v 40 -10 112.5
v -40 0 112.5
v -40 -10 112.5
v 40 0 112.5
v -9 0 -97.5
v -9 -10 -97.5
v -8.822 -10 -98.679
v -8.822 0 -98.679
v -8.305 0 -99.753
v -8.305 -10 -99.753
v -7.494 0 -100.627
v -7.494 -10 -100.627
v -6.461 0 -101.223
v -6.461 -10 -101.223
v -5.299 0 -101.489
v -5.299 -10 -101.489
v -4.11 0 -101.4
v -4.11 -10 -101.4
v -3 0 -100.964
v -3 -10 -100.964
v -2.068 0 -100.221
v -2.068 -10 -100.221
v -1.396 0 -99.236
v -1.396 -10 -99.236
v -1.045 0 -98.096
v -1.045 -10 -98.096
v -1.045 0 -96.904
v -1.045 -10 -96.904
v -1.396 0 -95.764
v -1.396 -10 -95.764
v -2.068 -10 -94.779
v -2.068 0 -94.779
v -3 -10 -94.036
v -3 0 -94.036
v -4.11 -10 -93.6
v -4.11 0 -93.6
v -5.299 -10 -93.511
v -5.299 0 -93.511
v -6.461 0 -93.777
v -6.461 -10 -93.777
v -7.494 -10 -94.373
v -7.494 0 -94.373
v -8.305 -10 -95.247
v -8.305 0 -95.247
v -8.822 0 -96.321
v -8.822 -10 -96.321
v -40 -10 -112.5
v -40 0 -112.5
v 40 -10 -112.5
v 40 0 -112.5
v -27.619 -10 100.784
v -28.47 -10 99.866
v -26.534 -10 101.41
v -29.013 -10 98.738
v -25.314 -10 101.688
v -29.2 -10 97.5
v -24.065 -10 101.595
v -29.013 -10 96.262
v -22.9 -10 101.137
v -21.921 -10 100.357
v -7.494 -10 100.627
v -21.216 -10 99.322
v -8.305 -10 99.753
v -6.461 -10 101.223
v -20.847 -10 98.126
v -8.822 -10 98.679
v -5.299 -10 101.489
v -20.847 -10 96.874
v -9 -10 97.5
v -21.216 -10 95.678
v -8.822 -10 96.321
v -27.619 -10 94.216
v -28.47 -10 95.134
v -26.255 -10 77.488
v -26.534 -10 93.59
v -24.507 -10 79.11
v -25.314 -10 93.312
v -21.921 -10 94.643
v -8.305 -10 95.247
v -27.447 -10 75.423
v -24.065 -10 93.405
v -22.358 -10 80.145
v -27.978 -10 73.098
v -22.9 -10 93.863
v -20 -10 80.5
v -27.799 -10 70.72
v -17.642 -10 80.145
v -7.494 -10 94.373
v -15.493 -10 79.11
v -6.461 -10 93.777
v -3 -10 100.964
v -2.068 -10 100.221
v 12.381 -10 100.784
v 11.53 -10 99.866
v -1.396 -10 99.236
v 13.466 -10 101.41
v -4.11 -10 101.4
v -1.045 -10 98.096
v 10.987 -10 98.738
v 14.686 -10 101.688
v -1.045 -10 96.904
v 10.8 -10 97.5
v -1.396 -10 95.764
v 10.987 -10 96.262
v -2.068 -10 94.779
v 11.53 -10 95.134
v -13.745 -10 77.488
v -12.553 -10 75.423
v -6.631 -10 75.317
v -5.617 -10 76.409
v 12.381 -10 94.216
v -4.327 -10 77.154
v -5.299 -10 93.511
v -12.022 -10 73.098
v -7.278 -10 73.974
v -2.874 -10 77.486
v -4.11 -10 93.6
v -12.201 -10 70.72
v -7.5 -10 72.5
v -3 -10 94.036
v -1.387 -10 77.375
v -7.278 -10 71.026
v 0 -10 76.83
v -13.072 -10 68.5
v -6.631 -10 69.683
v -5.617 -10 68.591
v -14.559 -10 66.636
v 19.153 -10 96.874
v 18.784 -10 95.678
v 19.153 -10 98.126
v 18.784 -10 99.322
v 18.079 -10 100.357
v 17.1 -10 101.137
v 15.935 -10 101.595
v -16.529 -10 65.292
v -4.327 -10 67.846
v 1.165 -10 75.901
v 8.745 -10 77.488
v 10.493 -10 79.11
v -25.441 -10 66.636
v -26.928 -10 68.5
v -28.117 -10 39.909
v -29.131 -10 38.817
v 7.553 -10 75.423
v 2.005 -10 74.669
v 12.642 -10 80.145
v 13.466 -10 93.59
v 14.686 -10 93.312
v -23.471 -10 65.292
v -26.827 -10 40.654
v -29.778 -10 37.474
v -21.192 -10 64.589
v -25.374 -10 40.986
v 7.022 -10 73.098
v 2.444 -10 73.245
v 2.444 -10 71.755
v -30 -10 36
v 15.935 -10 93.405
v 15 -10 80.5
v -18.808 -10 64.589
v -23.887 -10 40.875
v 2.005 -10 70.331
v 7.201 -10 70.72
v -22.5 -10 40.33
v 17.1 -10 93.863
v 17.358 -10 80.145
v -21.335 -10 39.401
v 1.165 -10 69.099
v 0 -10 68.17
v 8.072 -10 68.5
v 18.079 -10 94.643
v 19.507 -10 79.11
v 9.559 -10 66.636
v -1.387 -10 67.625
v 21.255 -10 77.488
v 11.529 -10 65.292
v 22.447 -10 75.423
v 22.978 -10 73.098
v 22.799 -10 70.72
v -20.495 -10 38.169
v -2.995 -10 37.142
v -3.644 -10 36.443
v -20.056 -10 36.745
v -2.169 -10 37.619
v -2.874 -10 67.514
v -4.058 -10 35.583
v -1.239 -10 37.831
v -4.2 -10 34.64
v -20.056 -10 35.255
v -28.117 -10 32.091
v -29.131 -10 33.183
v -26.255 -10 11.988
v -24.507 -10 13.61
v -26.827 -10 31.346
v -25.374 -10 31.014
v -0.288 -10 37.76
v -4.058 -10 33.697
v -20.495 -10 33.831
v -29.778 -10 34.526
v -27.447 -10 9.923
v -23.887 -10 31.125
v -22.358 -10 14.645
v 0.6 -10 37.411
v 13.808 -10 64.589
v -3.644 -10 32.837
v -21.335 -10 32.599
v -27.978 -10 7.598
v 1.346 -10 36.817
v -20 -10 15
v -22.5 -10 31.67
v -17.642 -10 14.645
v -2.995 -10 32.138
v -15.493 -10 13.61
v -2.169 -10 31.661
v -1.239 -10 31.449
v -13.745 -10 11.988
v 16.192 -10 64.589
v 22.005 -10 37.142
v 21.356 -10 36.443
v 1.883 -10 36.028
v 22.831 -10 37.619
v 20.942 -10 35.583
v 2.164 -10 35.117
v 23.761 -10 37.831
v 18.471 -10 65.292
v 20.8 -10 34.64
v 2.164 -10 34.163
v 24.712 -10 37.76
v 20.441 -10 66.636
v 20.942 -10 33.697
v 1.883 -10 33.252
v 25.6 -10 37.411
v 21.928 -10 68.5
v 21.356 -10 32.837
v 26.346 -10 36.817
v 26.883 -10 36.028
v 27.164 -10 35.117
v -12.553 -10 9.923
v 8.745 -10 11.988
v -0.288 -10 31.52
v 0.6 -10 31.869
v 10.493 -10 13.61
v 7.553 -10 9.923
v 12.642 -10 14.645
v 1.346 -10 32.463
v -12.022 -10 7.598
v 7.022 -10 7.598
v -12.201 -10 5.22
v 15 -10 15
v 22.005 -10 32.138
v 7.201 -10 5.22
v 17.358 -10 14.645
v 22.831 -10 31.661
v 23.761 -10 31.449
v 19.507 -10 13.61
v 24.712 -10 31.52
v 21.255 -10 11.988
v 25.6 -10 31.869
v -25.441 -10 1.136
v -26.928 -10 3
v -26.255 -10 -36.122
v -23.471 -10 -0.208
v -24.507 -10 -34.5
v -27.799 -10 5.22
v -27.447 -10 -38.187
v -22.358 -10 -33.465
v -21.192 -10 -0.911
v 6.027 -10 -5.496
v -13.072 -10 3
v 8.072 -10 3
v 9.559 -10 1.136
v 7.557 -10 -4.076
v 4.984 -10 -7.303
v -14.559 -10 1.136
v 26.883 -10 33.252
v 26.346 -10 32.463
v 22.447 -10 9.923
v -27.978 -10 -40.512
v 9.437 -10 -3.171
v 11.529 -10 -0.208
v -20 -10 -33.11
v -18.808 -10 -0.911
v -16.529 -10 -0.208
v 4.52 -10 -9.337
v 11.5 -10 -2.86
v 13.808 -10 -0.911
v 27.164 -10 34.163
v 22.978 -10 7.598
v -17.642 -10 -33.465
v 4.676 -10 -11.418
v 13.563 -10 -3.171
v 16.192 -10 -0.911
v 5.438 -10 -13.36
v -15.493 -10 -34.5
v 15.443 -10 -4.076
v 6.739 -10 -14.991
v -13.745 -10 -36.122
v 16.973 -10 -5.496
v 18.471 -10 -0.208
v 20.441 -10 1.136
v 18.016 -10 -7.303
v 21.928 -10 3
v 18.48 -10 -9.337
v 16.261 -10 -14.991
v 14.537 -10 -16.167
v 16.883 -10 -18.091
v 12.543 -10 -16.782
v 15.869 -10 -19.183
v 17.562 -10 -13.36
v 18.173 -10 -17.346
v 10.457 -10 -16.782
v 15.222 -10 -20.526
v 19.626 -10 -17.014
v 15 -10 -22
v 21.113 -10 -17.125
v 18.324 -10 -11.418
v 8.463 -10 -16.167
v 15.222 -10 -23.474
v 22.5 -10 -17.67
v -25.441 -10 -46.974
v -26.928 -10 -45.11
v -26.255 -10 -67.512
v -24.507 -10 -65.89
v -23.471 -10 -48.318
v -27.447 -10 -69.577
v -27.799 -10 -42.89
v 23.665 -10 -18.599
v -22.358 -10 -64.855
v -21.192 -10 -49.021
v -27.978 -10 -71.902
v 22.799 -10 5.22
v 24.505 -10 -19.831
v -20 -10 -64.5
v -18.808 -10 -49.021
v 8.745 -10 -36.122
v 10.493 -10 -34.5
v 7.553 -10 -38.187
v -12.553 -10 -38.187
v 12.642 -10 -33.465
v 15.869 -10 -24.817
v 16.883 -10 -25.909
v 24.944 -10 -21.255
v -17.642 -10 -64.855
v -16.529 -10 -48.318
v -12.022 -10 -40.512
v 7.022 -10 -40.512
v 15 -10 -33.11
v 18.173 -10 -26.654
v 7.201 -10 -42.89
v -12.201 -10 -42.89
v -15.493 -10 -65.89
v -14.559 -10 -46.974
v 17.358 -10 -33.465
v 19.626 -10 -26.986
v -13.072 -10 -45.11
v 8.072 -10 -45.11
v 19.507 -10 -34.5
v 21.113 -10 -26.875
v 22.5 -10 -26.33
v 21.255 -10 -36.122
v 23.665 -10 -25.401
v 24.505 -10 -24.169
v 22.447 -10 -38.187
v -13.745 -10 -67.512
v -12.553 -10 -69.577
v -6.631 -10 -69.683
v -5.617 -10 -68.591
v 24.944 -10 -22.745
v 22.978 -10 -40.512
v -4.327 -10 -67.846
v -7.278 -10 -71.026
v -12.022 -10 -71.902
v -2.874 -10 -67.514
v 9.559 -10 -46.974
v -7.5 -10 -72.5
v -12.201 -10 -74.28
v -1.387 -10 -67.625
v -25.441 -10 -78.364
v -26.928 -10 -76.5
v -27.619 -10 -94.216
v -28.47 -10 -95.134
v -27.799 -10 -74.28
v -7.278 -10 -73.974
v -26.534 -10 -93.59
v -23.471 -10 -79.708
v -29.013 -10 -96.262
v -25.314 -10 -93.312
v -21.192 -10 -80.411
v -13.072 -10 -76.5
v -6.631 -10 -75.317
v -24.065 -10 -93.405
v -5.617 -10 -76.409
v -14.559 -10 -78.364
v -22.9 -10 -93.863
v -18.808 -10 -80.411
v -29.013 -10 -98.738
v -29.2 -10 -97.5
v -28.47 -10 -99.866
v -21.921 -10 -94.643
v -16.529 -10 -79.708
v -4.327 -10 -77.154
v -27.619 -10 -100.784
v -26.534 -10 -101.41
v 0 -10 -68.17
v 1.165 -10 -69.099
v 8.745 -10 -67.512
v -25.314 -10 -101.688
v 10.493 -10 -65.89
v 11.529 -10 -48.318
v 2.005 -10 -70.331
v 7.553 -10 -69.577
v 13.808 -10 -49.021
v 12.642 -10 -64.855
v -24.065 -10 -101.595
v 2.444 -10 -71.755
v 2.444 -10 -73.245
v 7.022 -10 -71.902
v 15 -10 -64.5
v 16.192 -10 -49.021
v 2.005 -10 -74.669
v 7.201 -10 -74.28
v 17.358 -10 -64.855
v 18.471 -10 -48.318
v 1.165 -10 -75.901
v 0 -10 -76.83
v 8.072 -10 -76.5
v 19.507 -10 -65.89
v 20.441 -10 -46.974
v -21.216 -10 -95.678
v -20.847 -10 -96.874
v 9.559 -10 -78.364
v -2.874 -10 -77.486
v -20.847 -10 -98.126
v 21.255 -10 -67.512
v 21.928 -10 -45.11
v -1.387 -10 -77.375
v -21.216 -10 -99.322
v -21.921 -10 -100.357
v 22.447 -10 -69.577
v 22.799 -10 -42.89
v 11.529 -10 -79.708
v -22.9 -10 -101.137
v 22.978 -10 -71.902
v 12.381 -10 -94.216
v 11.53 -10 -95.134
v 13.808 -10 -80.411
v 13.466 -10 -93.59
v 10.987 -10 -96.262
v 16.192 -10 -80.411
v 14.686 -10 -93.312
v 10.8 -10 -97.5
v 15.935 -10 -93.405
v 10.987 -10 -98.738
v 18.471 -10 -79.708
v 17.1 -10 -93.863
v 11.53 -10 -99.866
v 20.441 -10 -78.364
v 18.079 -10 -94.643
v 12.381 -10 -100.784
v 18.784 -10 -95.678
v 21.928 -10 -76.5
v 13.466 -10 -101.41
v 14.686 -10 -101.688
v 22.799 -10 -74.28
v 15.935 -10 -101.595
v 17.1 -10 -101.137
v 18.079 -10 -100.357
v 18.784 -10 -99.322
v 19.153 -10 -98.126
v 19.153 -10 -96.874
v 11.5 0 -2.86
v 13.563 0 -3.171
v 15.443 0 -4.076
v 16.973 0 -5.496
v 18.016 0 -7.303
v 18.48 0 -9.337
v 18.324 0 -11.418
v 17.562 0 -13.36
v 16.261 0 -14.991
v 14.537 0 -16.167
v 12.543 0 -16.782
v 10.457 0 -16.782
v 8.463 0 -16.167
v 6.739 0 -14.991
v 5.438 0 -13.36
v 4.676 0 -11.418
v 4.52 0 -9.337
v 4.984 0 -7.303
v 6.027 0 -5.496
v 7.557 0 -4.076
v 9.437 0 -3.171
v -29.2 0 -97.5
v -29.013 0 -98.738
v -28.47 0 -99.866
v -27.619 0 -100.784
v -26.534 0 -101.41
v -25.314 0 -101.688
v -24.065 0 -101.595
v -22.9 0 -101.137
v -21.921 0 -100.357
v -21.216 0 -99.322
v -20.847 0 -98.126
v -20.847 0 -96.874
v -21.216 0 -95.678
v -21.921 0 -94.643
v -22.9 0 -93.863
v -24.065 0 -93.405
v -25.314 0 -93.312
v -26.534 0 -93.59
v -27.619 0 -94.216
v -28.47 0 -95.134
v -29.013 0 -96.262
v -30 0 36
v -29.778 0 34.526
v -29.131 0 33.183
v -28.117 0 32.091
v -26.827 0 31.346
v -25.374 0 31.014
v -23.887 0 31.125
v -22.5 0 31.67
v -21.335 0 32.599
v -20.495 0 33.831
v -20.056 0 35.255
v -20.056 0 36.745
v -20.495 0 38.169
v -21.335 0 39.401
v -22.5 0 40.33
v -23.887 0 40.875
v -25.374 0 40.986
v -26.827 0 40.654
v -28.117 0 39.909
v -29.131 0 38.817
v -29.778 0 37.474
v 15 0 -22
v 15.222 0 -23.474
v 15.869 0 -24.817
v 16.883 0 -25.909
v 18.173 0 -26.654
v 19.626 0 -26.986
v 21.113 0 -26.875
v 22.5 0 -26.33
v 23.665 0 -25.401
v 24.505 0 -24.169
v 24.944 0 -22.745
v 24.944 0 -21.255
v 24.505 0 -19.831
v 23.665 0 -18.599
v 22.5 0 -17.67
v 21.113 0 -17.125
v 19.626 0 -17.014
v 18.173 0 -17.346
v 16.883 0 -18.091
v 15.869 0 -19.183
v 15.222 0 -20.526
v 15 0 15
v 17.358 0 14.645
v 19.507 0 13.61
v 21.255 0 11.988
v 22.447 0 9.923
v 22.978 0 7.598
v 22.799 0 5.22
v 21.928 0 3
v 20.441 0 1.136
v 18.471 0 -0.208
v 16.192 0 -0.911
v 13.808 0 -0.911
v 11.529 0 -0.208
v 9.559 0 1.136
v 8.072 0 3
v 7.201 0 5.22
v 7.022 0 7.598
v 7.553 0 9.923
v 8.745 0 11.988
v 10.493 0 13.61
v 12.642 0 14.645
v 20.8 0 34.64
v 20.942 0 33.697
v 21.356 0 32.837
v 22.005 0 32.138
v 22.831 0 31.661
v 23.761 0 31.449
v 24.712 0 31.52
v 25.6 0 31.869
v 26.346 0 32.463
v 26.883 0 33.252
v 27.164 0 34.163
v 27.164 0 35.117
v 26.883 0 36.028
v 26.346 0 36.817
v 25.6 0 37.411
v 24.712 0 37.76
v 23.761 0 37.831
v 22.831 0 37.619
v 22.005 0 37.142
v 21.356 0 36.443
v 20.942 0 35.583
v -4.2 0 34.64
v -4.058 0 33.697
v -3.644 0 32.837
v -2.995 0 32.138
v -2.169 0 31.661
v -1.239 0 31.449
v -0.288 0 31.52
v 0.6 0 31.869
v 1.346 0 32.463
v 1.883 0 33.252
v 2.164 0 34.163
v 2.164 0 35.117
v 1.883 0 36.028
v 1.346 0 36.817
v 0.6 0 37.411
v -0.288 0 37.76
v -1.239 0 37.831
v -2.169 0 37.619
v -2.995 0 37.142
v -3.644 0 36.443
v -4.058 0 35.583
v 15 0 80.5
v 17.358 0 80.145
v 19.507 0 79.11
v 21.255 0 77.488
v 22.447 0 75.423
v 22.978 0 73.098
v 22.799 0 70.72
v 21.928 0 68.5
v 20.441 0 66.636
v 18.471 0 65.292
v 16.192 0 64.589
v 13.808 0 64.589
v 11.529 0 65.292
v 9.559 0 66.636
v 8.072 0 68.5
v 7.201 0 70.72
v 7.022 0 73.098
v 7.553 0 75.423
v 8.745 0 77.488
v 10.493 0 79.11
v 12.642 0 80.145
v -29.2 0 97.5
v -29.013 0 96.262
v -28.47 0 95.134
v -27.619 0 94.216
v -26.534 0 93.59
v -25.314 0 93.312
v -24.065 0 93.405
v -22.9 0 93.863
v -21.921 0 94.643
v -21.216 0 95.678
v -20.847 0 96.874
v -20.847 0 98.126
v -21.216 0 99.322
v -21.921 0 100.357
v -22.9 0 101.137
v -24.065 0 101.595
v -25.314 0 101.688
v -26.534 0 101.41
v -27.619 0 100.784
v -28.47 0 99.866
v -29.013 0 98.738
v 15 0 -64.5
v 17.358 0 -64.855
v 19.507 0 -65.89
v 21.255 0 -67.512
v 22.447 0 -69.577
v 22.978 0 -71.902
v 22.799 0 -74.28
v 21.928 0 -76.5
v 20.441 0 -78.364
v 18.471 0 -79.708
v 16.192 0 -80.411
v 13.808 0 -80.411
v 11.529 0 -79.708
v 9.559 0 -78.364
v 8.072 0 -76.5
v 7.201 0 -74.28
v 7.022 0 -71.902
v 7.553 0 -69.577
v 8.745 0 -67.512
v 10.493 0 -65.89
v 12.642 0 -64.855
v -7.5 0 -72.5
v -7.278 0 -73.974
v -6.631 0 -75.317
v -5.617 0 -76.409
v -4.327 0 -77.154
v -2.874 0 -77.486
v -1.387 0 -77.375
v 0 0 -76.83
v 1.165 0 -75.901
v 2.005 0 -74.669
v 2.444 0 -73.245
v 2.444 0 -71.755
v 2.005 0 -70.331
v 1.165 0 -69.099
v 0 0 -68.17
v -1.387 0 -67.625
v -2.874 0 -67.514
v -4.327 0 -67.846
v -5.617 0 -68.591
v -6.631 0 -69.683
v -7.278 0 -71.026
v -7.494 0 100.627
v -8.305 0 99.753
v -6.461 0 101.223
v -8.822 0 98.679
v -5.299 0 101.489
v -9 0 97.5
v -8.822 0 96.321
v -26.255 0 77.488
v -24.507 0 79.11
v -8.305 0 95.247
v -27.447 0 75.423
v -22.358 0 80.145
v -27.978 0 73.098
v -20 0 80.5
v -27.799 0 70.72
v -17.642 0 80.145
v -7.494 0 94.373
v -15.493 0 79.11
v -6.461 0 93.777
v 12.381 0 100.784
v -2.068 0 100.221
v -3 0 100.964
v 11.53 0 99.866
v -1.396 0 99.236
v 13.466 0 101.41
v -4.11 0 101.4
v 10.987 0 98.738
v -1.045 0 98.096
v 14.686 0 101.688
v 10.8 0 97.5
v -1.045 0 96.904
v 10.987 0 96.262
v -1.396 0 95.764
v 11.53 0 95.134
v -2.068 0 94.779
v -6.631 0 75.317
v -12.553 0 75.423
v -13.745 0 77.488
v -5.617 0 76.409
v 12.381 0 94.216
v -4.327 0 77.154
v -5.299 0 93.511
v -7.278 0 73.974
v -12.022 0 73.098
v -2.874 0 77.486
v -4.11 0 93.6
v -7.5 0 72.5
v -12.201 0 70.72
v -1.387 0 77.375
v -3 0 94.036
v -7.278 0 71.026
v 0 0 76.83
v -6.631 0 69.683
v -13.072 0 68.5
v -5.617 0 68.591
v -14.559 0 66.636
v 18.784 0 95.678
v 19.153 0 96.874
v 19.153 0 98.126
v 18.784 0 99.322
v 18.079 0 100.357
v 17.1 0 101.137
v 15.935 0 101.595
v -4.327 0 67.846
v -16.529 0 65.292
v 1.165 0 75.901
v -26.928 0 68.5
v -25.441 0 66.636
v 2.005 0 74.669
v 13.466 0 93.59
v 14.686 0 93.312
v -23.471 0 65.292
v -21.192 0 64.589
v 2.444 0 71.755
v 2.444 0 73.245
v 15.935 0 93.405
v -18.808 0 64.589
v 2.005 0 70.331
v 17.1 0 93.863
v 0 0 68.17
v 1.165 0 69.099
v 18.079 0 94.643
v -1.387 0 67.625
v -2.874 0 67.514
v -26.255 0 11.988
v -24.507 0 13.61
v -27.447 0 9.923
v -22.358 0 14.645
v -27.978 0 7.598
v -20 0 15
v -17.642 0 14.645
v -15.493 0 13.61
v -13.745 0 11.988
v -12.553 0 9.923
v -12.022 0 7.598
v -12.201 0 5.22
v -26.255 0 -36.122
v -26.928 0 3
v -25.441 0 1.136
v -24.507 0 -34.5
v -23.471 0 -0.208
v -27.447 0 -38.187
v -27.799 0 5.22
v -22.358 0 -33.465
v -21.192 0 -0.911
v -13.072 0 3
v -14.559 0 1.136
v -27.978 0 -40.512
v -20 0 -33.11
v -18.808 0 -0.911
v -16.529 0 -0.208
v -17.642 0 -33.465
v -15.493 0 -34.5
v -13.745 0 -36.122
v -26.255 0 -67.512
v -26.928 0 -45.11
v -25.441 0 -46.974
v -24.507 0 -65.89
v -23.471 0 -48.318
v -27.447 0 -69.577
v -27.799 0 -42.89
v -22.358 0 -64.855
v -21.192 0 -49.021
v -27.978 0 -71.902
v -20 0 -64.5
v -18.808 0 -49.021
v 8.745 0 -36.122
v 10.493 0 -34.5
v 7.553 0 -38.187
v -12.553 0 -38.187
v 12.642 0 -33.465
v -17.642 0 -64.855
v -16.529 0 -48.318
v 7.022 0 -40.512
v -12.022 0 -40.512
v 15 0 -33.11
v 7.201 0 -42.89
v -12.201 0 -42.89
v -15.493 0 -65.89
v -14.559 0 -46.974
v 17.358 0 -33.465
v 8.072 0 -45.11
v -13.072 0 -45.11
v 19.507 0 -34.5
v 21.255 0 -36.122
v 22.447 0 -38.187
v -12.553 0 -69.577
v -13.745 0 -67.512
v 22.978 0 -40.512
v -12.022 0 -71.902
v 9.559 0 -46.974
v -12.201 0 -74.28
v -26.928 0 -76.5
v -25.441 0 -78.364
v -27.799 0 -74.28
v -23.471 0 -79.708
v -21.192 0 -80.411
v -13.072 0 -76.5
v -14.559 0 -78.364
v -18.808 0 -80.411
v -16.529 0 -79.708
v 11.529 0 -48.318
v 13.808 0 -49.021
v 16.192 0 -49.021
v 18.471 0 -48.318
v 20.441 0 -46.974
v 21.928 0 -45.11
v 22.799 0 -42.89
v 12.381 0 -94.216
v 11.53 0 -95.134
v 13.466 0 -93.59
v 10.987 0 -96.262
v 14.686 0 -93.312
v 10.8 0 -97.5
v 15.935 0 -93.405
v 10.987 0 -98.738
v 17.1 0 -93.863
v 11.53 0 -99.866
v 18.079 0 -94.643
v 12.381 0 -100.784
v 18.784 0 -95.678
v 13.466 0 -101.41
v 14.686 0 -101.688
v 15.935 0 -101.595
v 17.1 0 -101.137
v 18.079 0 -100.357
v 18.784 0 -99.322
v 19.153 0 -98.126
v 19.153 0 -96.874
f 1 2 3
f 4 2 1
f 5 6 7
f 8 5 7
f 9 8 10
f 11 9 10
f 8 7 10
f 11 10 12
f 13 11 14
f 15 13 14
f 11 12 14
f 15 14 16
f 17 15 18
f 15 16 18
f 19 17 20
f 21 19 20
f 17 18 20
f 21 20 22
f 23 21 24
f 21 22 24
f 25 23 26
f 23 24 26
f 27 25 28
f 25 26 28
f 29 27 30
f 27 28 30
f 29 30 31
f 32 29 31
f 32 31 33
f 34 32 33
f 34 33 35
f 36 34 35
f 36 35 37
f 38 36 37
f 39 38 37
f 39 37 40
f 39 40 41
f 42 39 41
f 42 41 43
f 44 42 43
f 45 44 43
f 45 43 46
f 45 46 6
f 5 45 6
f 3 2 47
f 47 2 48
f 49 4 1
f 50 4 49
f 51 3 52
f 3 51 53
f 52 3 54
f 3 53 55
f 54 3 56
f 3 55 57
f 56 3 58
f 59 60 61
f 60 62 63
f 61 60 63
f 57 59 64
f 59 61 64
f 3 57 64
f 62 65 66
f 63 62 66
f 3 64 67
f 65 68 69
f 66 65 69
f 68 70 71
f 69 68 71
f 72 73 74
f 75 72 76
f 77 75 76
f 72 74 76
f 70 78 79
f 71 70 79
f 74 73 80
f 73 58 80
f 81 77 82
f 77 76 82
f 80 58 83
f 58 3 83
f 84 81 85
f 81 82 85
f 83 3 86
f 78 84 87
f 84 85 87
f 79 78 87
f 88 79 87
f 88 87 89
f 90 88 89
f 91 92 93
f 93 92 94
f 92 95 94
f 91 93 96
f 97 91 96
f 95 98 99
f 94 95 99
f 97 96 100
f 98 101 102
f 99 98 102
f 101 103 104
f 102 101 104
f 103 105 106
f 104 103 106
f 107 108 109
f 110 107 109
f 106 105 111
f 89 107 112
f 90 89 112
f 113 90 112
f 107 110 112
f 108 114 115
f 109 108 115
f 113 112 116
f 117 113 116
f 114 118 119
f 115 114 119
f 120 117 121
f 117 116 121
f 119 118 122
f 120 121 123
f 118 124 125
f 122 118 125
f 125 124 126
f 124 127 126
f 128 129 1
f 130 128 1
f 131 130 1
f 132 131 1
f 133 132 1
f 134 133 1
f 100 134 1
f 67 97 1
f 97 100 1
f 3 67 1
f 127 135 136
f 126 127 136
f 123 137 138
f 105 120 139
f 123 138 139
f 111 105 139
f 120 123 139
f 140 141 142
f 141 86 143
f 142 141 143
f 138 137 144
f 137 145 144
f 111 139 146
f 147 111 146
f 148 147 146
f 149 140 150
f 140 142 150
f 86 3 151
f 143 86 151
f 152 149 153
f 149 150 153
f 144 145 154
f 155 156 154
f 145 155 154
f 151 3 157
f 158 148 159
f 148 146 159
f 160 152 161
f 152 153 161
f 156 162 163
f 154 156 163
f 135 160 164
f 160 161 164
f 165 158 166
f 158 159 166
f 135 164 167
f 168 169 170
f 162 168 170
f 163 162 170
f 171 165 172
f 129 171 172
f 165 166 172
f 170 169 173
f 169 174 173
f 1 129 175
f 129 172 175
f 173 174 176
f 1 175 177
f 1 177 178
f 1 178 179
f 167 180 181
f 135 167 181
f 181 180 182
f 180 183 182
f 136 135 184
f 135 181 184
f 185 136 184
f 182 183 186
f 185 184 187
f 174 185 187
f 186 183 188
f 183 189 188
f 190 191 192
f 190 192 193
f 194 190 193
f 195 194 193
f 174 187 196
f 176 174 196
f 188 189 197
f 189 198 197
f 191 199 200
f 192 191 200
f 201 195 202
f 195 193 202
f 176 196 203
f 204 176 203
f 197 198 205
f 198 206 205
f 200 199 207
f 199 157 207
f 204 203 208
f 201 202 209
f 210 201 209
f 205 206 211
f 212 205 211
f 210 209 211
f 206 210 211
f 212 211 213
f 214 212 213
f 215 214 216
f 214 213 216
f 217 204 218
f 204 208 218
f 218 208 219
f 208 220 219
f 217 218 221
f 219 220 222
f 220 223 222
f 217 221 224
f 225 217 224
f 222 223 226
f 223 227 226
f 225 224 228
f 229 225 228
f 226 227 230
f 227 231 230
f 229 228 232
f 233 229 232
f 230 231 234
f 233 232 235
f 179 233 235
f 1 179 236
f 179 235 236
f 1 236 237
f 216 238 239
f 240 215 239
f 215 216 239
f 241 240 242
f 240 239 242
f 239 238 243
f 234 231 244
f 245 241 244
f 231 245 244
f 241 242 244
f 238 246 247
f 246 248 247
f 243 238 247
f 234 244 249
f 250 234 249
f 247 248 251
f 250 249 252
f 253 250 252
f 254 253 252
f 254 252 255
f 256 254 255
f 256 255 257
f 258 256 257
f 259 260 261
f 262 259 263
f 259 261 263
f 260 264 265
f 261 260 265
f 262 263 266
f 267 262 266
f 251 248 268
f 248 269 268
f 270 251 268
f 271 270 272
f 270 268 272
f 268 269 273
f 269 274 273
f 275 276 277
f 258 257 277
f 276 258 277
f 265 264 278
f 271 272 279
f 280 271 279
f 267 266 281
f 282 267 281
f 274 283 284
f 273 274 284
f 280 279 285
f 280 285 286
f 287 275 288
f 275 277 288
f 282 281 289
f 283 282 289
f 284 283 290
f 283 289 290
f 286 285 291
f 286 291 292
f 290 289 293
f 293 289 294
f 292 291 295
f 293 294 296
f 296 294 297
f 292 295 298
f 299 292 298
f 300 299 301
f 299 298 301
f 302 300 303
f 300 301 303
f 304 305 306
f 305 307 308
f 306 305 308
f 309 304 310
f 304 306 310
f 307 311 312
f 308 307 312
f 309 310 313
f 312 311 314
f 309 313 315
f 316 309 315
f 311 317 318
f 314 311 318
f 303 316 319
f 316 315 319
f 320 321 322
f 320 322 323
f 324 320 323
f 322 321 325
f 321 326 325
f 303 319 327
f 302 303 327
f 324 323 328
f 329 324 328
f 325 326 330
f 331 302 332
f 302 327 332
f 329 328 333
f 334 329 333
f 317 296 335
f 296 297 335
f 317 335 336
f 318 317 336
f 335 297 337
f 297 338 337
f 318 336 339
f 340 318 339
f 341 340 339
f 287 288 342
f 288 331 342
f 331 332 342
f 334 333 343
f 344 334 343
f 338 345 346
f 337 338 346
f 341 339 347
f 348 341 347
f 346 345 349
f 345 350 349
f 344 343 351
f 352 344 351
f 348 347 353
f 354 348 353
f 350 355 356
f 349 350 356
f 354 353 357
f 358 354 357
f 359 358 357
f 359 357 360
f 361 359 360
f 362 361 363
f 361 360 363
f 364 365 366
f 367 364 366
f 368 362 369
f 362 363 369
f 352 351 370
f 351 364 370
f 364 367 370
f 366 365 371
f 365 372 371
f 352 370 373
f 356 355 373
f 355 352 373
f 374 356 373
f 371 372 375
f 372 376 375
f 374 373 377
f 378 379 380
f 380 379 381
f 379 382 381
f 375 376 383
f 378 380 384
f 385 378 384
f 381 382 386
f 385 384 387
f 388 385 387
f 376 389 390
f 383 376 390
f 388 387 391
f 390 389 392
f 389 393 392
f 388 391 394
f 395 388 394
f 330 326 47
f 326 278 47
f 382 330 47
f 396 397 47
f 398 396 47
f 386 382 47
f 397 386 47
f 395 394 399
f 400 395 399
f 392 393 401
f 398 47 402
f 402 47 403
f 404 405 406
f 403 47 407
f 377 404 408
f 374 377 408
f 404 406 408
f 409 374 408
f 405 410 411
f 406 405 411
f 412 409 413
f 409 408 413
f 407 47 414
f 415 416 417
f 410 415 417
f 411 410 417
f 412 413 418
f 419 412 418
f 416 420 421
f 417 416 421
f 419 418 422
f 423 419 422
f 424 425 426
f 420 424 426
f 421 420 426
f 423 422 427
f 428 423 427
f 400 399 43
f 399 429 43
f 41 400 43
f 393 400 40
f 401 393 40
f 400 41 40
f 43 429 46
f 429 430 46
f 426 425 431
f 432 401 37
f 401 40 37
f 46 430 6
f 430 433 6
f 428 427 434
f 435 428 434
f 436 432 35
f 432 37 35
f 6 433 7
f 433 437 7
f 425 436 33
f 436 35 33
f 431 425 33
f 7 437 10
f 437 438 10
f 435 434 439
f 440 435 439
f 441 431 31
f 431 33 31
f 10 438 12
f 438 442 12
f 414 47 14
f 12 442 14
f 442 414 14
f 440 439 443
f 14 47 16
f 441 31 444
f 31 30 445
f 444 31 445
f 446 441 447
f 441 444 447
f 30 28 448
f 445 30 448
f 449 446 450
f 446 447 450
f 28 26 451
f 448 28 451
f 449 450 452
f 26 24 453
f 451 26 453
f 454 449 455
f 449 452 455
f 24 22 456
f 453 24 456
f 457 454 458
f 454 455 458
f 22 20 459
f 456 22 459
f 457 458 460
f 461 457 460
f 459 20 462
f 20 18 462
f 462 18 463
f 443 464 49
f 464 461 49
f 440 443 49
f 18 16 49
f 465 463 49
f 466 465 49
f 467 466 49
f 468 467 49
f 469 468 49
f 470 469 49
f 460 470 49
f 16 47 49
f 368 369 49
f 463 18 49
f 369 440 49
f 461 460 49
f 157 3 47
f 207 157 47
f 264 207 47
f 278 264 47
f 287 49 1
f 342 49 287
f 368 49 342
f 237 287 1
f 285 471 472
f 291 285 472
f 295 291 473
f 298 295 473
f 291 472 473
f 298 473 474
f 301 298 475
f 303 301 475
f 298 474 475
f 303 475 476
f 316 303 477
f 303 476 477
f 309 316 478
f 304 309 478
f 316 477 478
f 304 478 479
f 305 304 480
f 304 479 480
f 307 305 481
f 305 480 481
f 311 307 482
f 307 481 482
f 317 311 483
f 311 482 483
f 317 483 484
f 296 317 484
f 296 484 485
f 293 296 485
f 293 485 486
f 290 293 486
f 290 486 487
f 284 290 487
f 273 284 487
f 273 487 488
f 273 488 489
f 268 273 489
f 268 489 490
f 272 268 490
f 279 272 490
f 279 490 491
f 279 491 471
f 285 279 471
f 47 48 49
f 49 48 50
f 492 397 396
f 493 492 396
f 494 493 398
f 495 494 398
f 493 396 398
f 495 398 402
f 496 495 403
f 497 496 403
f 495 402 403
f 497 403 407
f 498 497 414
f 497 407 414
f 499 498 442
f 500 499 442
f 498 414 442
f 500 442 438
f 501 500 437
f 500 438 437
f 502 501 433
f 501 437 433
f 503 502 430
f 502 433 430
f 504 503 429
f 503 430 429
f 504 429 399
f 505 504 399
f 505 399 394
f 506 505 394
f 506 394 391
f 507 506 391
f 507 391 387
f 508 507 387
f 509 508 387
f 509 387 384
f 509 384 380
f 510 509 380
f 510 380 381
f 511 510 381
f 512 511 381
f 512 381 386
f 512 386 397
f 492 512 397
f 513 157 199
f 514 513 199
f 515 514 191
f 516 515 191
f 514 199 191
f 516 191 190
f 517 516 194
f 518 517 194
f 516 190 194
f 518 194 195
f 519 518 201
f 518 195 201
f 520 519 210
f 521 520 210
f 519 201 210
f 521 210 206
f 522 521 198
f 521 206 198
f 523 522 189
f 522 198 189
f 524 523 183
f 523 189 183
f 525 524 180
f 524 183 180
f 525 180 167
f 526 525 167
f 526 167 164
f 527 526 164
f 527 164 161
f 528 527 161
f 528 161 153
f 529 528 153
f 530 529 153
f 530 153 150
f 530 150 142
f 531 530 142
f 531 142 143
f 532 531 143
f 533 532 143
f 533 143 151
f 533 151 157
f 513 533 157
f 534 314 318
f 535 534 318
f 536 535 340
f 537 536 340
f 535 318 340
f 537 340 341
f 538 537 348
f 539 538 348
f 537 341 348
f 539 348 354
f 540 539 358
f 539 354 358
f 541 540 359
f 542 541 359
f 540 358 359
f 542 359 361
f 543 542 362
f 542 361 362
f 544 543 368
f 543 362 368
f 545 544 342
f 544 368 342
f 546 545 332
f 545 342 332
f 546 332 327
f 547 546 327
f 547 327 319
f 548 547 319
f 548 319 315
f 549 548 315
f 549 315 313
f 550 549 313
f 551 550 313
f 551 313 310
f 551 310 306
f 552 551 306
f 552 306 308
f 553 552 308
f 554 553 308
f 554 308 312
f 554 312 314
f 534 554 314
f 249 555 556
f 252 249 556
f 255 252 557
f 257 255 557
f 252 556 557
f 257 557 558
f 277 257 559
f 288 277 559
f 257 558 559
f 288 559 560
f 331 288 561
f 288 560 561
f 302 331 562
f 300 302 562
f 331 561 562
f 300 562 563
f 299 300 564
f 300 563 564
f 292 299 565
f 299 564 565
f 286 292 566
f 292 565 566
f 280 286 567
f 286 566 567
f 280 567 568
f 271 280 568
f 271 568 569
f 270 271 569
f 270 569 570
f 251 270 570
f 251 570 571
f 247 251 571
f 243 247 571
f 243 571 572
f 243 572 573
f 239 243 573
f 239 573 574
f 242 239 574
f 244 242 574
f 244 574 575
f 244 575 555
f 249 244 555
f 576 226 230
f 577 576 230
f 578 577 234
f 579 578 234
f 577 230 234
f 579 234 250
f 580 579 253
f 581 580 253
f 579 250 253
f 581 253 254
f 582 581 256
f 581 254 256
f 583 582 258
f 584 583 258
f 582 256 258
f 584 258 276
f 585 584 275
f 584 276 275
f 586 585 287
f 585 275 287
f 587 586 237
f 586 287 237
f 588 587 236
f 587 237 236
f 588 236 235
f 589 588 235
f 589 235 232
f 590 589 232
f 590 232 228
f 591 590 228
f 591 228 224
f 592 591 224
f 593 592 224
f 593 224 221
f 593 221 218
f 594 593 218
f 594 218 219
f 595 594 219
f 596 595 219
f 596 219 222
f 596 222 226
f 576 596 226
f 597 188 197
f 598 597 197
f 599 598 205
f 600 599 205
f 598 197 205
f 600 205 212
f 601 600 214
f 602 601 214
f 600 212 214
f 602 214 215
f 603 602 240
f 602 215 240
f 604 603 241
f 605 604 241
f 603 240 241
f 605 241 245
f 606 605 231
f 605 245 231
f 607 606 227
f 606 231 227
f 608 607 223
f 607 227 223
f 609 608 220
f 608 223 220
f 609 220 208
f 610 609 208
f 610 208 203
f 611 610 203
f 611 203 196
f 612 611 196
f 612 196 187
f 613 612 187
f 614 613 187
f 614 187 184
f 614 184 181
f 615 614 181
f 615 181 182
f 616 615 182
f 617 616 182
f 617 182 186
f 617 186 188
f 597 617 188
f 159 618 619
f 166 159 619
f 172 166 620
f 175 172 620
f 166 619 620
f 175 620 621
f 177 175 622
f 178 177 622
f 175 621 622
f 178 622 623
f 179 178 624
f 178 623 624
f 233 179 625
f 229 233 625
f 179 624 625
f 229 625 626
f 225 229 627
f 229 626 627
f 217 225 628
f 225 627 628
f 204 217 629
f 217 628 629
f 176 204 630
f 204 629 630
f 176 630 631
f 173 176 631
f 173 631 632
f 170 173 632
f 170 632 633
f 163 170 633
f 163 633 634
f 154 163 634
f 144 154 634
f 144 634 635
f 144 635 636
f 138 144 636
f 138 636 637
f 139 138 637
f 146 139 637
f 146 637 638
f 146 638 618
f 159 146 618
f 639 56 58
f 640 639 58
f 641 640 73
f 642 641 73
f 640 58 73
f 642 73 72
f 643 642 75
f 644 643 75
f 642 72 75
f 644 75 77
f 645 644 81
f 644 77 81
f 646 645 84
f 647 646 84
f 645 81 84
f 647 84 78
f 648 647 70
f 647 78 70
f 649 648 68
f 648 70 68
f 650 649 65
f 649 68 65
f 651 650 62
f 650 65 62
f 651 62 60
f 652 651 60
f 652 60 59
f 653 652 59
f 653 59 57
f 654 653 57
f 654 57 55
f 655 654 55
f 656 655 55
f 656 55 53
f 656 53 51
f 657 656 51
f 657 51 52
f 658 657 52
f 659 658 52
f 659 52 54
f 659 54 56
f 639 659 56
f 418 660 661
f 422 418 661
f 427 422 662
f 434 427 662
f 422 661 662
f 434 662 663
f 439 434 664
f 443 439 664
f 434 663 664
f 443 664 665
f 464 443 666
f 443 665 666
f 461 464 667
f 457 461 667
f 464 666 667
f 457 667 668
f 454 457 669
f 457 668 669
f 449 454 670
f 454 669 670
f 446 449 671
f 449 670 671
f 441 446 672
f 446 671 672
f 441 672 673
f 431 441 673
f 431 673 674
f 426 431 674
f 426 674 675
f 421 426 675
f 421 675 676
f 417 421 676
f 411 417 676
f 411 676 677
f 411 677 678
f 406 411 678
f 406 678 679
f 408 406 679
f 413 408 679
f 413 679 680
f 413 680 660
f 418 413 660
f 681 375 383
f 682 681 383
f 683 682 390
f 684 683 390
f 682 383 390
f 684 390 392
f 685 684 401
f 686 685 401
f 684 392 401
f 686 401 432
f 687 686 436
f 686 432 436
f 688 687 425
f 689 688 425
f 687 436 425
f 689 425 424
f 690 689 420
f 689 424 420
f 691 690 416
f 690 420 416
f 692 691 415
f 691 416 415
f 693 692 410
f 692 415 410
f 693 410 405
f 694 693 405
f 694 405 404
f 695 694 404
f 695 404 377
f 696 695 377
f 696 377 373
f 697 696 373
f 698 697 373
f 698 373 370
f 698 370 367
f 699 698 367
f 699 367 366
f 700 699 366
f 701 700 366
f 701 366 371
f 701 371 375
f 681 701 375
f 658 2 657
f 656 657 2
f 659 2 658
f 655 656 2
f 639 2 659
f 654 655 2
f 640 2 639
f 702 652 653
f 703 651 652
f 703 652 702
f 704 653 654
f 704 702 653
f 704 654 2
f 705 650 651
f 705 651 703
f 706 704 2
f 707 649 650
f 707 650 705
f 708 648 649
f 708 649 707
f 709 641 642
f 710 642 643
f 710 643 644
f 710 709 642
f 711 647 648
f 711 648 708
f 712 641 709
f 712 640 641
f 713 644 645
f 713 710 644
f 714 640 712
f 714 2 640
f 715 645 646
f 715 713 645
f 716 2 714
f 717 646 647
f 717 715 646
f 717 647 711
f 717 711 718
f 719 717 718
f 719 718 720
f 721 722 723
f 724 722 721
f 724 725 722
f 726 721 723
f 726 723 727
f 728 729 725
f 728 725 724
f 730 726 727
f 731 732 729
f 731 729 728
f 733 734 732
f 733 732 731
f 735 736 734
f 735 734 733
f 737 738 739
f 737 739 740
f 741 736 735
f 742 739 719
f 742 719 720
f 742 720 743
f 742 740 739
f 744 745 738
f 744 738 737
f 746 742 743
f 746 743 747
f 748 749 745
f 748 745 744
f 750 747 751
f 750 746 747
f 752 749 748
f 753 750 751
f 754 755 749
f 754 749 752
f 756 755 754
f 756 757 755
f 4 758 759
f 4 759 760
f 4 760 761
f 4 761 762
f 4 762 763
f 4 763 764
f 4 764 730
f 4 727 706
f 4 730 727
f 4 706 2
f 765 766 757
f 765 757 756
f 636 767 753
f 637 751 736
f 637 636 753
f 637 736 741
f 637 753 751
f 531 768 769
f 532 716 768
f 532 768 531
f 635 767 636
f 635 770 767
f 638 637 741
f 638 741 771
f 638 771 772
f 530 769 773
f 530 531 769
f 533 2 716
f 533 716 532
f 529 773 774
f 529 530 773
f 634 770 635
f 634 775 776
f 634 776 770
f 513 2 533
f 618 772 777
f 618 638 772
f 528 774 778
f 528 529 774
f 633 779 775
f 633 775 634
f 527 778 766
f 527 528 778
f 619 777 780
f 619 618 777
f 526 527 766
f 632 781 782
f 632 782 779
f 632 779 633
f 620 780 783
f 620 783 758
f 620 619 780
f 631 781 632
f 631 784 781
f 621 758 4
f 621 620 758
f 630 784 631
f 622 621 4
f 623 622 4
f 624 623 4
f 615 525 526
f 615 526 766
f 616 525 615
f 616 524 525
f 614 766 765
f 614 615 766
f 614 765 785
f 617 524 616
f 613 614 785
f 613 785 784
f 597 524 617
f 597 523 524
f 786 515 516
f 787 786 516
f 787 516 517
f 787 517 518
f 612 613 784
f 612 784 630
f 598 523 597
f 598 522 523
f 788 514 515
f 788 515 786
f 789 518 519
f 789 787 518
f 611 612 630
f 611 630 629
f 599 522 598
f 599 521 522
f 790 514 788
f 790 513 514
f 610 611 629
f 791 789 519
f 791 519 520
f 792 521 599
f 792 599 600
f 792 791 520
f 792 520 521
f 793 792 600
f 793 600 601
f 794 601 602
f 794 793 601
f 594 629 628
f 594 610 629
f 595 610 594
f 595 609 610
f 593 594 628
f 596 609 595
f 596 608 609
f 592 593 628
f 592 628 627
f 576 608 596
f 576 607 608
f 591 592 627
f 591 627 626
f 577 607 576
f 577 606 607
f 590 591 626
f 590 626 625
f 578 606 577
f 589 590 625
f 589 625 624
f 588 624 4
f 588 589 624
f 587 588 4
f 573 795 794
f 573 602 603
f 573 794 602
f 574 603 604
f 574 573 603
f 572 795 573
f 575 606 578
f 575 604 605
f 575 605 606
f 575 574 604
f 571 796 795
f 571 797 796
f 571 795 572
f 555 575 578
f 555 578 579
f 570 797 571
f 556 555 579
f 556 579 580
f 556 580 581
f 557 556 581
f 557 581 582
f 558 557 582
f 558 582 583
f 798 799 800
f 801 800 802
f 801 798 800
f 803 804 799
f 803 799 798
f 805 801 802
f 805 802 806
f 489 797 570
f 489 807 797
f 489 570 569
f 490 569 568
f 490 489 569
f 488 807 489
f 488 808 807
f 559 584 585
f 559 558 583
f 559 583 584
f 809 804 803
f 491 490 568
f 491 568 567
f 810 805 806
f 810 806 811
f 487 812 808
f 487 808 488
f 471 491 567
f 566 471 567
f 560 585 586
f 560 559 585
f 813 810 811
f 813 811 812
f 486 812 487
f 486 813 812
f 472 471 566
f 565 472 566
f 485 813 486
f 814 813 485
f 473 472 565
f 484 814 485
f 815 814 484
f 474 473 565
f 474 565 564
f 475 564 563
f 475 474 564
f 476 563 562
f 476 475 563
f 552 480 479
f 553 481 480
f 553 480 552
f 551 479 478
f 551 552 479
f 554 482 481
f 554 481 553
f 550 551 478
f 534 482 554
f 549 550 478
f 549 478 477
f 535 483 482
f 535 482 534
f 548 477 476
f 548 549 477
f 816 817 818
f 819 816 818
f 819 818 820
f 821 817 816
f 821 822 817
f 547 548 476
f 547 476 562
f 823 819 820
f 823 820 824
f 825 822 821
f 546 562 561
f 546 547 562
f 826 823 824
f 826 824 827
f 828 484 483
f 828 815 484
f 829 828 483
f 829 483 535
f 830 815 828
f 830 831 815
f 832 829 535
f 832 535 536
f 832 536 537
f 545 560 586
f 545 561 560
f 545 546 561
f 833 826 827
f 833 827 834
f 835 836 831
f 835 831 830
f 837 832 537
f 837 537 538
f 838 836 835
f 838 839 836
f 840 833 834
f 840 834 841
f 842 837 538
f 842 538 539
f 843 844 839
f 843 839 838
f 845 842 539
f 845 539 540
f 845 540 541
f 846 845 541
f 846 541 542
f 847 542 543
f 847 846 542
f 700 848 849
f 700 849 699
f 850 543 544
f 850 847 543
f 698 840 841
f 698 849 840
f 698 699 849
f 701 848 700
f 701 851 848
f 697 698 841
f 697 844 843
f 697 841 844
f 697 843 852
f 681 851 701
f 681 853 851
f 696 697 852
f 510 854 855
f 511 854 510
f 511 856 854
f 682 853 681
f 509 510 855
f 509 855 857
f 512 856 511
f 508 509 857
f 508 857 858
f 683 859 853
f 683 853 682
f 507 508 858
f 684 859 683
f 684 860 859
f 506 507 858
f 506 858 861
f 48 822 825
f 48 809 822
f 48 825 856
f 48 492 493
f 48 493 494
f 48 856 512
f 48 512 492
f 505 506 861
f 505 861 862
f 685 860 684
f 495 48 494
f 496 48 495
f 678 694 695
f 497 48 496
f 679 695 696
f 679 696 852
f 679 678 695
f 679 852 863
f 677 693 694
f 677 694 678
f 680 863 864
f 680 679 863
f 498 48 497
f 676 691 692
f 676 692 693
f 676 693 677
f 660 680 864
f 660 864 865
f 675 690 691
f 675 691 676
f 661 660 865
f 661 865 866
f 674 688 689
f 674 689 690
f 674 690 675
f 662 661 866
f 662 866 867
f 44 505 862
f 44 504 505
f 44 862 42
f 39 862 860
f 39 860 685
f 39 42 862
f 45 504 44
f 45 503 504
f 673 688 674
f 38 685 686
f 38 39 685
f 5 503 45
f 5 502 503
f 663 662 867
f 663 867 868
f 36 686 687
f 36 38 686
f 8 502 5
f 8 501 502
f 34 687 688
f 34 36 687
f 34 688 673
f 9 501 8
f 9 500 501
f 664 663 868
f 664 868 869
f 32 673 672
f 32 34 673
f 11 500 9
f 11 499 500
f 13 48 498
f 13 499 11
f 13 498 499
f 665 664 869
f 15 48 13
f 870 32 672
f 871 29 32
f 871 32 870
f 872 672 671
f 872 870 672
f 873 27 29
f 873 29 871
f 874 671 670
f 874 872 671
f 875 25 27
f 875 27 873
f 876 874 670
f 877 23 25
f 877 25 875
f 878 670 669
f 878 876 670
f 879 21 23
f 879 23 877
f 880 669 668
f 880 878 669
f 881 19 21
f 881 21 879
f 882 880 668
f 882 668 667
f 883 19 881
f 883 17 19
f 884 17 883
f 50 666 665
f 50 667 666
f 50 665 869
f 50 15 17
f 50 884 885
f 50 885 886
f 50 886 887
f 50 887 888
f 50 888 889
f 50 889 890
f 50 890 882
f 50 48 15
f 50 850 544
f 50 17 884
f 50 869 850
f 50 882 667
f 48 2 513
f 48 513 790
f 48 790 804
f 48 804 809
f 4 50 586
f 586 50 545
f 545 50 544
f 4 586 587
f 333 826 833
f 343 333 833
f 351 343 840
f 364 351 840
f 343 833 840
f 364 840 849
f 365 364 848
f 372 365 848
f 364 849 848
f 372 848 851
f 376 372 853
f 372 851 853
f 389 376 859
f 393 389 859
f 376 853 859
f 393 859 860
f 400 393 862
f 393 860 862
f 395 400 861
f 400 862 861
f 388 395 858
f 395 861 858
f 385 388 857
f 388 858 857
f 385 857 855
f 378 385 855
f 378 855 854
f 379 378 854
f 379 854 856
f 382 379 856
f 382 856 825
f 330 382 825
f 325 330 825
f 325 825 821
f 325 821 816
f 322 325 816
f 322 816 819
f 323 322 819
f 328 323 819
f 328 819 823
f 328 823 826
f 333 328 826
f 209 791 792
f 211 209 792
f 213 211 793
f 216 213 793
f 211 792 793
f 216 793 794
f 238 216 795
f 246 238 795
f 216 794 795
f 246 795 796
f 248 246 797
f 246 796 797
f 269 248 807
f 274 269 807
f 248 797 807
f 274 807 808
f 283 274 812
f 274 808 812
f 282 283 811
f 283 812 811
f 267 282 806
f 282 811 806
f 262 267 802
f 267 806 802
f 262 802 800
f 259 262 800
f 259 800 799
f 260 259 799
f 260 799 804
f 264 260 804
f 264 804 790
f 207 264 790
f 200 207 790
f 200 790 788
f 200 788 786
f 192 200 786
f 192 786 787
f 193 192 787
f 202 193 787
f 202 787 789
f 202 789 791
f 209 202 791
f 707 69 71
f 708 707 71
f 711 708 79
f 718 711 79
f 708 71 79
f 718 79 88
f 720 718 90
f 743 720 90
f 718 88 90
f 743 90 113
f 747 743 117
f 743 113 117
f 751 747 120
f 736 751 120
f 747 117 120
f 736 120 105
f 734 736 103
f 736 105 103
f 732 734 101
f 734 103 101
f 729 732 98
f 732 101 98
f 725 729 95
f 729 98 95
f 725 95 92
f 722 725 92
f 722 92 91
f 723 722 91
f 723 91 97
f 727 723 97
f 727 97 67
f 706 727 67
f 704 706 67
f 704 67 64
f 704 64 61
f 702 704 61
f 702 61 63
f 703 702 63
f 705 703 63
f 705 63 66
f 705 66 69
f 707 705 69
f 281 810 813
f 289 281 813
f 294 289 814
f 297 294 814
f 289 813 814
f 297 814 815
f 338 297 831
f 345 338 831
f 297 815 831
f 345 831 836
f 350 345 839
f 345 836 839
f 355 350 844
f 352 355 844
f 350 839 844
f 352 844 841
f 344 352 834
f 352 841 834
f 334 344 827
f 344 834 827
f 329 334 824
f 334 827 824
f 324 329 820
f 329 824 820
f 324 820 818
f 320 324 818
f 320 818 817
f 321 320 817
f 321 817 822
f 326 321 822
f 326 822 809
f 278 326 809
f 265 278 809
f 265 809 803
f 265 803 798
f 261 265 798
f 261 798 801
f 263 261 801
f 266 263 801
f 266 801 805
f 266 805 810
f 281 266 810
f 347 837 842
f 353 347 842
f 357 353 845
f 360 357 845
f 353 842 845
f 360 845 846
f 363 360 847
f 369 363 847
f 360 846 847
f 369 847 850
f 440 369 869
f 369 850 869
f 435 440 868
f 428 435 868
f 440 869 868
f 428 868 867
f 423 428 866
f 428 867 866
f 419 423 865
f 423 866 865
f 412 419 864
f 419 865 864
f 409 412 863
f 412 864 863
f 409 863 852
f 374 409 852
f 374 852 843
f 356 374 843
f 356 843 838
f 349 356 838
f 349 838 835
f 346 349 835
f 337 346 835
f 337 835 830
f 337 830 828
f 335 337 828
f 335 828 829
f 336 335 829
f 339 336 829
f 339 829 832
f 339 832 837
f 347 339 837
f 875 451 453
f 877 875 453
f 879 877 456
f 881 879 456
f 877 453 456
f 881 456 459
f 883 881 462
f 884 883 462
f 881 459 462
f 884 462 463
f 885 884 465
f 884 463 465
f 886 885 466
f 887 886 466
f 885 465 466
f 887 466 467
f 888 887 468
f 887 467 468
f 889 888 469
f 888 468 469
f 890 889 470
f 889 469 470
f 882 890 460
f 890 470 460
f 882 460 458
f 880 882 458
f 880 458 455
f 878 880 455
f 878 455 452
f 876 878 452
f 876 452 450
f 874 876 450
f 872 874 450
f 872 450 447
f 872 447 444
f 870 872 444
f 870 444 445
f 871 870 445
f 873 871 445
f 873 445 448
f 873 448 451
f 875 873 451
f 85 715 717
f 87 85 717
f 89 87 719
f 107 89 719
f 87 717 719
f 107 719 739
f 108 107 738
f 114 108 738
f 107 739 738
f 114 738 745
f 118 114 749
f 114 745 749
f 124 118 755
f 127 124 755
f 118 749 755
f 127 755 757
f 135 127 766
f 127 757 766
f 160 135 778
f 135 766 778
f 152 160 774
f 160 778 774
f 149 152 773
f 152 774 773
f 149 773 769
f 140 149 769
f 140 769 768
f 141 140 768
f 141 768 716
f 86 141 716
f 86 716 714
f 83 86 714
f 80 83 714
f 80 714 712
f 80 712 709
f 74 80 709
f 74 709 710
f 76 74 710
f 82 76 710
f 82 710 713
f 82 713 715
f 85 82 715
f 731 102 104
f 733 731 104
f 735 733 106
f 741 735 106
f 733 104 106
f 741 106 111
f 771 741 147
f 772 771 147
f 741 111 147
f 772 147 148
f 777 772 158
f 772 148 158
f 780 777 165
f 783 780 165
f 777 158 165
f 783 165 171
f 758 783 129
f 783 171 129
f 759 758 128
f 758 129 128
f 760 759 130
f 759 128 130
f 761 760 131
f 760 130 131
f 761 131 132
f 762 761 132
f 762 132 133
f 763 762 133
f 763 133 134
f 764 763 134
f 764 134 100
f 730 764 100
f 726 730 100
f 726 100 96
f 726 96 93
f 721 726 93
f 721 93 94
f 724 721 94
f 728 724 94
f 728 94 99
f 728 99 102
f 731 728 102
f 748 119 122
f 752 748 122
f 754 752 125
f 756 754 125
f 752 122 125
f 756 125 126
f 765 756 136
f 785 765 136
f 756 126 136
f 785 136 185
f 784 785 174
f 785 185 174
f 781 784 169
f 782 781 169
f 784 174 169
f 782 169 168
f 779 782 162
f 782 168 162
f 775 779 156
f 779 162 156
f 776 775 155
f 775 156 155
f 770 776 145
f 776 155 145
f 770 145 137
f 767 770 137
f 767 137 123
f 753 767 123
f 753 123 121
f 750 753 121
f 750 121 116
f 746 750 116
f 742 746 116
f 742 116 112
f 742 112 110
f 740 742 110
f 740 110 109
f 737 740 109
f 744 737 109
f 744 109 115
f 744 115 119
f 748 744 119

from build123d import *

# Parameters (mm, degrees)
SKETCH2_W                  = 80
SKETCH2_H                  = 225
BOSS_EXTRUDE1_DEPTH        = 10
CUT_EXTRUDE1_REACH         = 121.818
SKETCH3_R                  = 8
M8_CLEARANCE_HOLE1_D       = 8.4
F_8_0MM_DOWEL_HOLE1_D      = 8
F_10_0_10_DIAMETER_HOLE1_D = 10
M6_CLEARANCE_HOLE1_D       = 6.4
CUT_EXTRUDE2_REACH         = 121.818
SKETCH16_R                 = 7


with BuildPart() as part:
    # Sketch2 → Boss-Extrude1 (new body)
    with BuildSketch(Plane(origin=(0, 0, 0), x_dir=(1, 0, 0), z_dir=(0, 1, 0))):
        Rectangle(SKETCH2_W, SKETCH2_H)
    extrude(amount=-BOSS_EXTRUDE1_DEPTH)

    # Sketch3 → Cut-Extrude1 (cut, up to next)
    with BuildSketch(Plane(origin=(0, 0, 0), x_dir=(1, 0, 0), z_dir=(0, 1, 0)), mode=Mode.PRIVATE) as cut_extrude1_sk1:
        with Locations((15, -7)):
            Circle(SKETCH3_R)
    cut_extrude1_tool1 = extrude(cut_extrude1_sk1.sketch, amount=-CUT_EXTRUDE1_REACH, mode=Mode.PRIVATE) & part.part
    # Sketch3 → Cut-Extrude1 (cut, up to next)
    with BuildSketch(Plane(origin=(0, 0, 0), x_dir=(1, 0, 0), z_dir=(0, 1, 0)), mode=Mode.PRIVATE) as cut_extrude1_sk2:
        with Locations((15, 41.11)):
            Circle(SKETCH3_R)
    cut_extrude1_tool2 = extrude(cut_extrude1_sk2.sketch, amount=-CUT_EXTRUDE1_REACH, mode=Mode.PRIVATE) & part.part
    # Sketch3 → Cut-Extrude1 (cut, up to next)
    with BuildSketch(Plane(origin=(0, 0, 0), x_dir=(1, 0, 0), z_dir=(0, 1, 0)), mode=Mode.PRIVATE) as cut_extrude1_sk3:
        with Locations((15, -72.5)):
            Circle(SKETCH3_R)
    cut_extrude1_tool3 = extrude(cut_extrude1_sk3.sketch, amount=-CUT_EXTRUDE1_REACH, mode=Mode.PRIVATE) & part.part
    # Sketch3 → Cut-Extrude1 (cut, up to next)
    with BuildSketch(Plane(origin=(0, 0, 0), x_dir=(1, 0, 0), z_dir=(0, 1, 0)), mode=Mode.PRIVATE) as cut_extrude1_sk4:
        with Locations((-20, -72.5)):
            Circle(SKETCH3_R)
    cut_extrude1_tool4 = extrude(cut_extrude1_sk4.sketch, amount=-CUT_EXTRUDE1_REACH, mode=Mode.PRIVATE) & part.part
    # Sketch3 → Cut-Extrude1 (cut, up to next)
    with BuildSketch(Plane(origin=(0, 0, 0), x_dir=(1, 0, 0), z_dir=(0, 1, 0)), mode=Mode.PRIVATE) as cut_extrude1_sk5:
        with Locations((-20, -7)):
            Circle(SKETCH3_R)
    cut_extrude1_tool5 = extrude(cut_extrude1_sk5.sketch, amount=-CUT_EXTRUDE1_REACH, mode=Mode.PRIVATE) & part.part
    # Sketch3 → Cut-Extrude1 (cut, up to next)
    with BuildSketch(Plane(origin=(0, 0, 0), x_dir=(1, 0, 0), z_dir=(0, 1, 0)), mode=Mode.PRIVATE) as cut_extrude1_sk6:
        with Locations((-20, 41.11)):
            Circle(SKETCH3_R)
    cut_extrude1_tool6 = extrude(cut_extrude1_sk6.sketch, amount=-CUT_EXTRUDE1_REACH, mode=Mode.PRIVATE) & part.part
    # Sketch3 → Cut-Extrude1 (cut, up to next)
    with BuildSketch(Plane(origin=(0, 0, 0), x_dir=(1, 0, 0), z_dir=(0, 1, 0)), mode=Mode.PRIVATE) as cut_extrude1_sk7:
        with Locations((-20, 72.5)):
            Circle(SKETCH3_R)
    cut_extrude1_tool7 = extrude(cut_extrude1_sk7.sketch, amount=-CUT_EXTRUDE1_REACH, mode=Mode.PRIVATE) & part.part
    # Sketch3 → Cut-Extrude1 (cut, up to next)
    with BuildSketch(Plane(origin=(0, 0, 0), x_dir=(1, 0, 0), z_dir=(0, 1, 0)), mode=Mode.PRIVATE) as cut_extrude1_sk8:
        with Locations((15, 72.5)):
            Circle(SKETCH3_R)
    cut_extrude1_tool8 = extrude(cut_extrude1_sk8.sketch, amount=-CUT_EXTRUDE1_REACH, mode=Mode.PRIVATE) & part.part
    add(cut_extrude1_tool1.solids().sort_by_distance((15, 0, 7))[0], mode=Mode.SUBTRACT)
    add(cut_extrude1_tool2.solids().sort_by_distance((15, 0, -41.11))[0], mode=Mode.SUBTRACT)
    add(cut_extrude1_tool3.solids().sort_by_distance((15, 0, 72.5))[0], mode=Mode.SUBTRACT)
    add(cut_extrude1_tool4.solids().sort_by_distance((-20, 0, 72.5))[0], mode=Mode.SUBTRACT)
    add(cut_extrude1_tool5.solids().sort_by_distance((-20, 0, 7))[0], mode=Mode.SUBTRACT)
    add(cut_extrude1_tool6.solids().sort_by_distance((-20, 0, -41.11))[0], mode=Mode.SUBTRACT)
    add(cut_extrude1_tool7.solids().sort_by_distance((-20, 0, -72.5))[0], mode=Mode.SUBTRACT)
    add(cut_extrude1_tool8.solids().sort_by_distance((15, 0, -72.5))[0], mode=Mode.SUBTRACT)

    # M8 Clearance Hole1 (through all)
    with Locations(Plane(origin=(0, 0, 0), x_dir=(1, 0, 0), z_dir=(0, 1, 0))):
        with Locations((-25, -97.5), (15, -97.5), (15, 97.5), (-25, 97.5)):
            Hole(M8_CLEARANCE_HOLE1_D / 2)

    # Ø8.0mm Dowel Hole1 (through all)
    with Locations(Plane(origin=(0, 0, 0), x_dir=(1, 0, 0), z_dir=(0, 1, 0))):
        with Locations((-5, 97.5), (-5, -97.5)):
            Hole(F_8_0MM_DOWEL_HOLE1_D / 2)

    # Ø10.0 (10) Diameter Hole1 (through all)
    with Locations(Plane(origin=(0, 0, 0), x_dir=(1, 0, 0), z_dir=(0, 1, 0))):
        with Locations((-2.5, -72.5), (-2.5, 72.5), (20, 22), (-25, -36)):
            Hole(F_10_0_10_DIAMETER_HOLE1_D / 2)

    # M6 Clearance Hole1 (through all)
    with Locations(Plane(origin=(0, 0, 0), x_dir=(1, 0, 0), z_dir=(0, 1, 0))):
        with Locations((24, -34.64), (-1, -34.64)):
            Hole(M6_CLEARANCE_HOLE1_D / 2)

    # Sketch16 → Cut-Extrude2 (cut, up to next)
    with BuildSketch(Plane(origin=(0, 0, 0), x_dir=(1, 0, 0), z_dir=(0, 1, 0)), mode=Mode.PRIVATE) as cut_extrude2_sk1:
        with Locations((11.5, 9.86)):
            Circle(SKETCH16_R)
    cut_extrude2_tool1 = extrude(cut_extrude2_sk1.sketch, amount=-CUT_EXTRUDE2_REACH, mode=Mode.PRIVATE) & part.part
    add(cut_extrude2_tool1.solids().sort_by_distance((11.5, 0, -9.86))[0], mode=Mode.SUBTRACT)


solid = part.part
